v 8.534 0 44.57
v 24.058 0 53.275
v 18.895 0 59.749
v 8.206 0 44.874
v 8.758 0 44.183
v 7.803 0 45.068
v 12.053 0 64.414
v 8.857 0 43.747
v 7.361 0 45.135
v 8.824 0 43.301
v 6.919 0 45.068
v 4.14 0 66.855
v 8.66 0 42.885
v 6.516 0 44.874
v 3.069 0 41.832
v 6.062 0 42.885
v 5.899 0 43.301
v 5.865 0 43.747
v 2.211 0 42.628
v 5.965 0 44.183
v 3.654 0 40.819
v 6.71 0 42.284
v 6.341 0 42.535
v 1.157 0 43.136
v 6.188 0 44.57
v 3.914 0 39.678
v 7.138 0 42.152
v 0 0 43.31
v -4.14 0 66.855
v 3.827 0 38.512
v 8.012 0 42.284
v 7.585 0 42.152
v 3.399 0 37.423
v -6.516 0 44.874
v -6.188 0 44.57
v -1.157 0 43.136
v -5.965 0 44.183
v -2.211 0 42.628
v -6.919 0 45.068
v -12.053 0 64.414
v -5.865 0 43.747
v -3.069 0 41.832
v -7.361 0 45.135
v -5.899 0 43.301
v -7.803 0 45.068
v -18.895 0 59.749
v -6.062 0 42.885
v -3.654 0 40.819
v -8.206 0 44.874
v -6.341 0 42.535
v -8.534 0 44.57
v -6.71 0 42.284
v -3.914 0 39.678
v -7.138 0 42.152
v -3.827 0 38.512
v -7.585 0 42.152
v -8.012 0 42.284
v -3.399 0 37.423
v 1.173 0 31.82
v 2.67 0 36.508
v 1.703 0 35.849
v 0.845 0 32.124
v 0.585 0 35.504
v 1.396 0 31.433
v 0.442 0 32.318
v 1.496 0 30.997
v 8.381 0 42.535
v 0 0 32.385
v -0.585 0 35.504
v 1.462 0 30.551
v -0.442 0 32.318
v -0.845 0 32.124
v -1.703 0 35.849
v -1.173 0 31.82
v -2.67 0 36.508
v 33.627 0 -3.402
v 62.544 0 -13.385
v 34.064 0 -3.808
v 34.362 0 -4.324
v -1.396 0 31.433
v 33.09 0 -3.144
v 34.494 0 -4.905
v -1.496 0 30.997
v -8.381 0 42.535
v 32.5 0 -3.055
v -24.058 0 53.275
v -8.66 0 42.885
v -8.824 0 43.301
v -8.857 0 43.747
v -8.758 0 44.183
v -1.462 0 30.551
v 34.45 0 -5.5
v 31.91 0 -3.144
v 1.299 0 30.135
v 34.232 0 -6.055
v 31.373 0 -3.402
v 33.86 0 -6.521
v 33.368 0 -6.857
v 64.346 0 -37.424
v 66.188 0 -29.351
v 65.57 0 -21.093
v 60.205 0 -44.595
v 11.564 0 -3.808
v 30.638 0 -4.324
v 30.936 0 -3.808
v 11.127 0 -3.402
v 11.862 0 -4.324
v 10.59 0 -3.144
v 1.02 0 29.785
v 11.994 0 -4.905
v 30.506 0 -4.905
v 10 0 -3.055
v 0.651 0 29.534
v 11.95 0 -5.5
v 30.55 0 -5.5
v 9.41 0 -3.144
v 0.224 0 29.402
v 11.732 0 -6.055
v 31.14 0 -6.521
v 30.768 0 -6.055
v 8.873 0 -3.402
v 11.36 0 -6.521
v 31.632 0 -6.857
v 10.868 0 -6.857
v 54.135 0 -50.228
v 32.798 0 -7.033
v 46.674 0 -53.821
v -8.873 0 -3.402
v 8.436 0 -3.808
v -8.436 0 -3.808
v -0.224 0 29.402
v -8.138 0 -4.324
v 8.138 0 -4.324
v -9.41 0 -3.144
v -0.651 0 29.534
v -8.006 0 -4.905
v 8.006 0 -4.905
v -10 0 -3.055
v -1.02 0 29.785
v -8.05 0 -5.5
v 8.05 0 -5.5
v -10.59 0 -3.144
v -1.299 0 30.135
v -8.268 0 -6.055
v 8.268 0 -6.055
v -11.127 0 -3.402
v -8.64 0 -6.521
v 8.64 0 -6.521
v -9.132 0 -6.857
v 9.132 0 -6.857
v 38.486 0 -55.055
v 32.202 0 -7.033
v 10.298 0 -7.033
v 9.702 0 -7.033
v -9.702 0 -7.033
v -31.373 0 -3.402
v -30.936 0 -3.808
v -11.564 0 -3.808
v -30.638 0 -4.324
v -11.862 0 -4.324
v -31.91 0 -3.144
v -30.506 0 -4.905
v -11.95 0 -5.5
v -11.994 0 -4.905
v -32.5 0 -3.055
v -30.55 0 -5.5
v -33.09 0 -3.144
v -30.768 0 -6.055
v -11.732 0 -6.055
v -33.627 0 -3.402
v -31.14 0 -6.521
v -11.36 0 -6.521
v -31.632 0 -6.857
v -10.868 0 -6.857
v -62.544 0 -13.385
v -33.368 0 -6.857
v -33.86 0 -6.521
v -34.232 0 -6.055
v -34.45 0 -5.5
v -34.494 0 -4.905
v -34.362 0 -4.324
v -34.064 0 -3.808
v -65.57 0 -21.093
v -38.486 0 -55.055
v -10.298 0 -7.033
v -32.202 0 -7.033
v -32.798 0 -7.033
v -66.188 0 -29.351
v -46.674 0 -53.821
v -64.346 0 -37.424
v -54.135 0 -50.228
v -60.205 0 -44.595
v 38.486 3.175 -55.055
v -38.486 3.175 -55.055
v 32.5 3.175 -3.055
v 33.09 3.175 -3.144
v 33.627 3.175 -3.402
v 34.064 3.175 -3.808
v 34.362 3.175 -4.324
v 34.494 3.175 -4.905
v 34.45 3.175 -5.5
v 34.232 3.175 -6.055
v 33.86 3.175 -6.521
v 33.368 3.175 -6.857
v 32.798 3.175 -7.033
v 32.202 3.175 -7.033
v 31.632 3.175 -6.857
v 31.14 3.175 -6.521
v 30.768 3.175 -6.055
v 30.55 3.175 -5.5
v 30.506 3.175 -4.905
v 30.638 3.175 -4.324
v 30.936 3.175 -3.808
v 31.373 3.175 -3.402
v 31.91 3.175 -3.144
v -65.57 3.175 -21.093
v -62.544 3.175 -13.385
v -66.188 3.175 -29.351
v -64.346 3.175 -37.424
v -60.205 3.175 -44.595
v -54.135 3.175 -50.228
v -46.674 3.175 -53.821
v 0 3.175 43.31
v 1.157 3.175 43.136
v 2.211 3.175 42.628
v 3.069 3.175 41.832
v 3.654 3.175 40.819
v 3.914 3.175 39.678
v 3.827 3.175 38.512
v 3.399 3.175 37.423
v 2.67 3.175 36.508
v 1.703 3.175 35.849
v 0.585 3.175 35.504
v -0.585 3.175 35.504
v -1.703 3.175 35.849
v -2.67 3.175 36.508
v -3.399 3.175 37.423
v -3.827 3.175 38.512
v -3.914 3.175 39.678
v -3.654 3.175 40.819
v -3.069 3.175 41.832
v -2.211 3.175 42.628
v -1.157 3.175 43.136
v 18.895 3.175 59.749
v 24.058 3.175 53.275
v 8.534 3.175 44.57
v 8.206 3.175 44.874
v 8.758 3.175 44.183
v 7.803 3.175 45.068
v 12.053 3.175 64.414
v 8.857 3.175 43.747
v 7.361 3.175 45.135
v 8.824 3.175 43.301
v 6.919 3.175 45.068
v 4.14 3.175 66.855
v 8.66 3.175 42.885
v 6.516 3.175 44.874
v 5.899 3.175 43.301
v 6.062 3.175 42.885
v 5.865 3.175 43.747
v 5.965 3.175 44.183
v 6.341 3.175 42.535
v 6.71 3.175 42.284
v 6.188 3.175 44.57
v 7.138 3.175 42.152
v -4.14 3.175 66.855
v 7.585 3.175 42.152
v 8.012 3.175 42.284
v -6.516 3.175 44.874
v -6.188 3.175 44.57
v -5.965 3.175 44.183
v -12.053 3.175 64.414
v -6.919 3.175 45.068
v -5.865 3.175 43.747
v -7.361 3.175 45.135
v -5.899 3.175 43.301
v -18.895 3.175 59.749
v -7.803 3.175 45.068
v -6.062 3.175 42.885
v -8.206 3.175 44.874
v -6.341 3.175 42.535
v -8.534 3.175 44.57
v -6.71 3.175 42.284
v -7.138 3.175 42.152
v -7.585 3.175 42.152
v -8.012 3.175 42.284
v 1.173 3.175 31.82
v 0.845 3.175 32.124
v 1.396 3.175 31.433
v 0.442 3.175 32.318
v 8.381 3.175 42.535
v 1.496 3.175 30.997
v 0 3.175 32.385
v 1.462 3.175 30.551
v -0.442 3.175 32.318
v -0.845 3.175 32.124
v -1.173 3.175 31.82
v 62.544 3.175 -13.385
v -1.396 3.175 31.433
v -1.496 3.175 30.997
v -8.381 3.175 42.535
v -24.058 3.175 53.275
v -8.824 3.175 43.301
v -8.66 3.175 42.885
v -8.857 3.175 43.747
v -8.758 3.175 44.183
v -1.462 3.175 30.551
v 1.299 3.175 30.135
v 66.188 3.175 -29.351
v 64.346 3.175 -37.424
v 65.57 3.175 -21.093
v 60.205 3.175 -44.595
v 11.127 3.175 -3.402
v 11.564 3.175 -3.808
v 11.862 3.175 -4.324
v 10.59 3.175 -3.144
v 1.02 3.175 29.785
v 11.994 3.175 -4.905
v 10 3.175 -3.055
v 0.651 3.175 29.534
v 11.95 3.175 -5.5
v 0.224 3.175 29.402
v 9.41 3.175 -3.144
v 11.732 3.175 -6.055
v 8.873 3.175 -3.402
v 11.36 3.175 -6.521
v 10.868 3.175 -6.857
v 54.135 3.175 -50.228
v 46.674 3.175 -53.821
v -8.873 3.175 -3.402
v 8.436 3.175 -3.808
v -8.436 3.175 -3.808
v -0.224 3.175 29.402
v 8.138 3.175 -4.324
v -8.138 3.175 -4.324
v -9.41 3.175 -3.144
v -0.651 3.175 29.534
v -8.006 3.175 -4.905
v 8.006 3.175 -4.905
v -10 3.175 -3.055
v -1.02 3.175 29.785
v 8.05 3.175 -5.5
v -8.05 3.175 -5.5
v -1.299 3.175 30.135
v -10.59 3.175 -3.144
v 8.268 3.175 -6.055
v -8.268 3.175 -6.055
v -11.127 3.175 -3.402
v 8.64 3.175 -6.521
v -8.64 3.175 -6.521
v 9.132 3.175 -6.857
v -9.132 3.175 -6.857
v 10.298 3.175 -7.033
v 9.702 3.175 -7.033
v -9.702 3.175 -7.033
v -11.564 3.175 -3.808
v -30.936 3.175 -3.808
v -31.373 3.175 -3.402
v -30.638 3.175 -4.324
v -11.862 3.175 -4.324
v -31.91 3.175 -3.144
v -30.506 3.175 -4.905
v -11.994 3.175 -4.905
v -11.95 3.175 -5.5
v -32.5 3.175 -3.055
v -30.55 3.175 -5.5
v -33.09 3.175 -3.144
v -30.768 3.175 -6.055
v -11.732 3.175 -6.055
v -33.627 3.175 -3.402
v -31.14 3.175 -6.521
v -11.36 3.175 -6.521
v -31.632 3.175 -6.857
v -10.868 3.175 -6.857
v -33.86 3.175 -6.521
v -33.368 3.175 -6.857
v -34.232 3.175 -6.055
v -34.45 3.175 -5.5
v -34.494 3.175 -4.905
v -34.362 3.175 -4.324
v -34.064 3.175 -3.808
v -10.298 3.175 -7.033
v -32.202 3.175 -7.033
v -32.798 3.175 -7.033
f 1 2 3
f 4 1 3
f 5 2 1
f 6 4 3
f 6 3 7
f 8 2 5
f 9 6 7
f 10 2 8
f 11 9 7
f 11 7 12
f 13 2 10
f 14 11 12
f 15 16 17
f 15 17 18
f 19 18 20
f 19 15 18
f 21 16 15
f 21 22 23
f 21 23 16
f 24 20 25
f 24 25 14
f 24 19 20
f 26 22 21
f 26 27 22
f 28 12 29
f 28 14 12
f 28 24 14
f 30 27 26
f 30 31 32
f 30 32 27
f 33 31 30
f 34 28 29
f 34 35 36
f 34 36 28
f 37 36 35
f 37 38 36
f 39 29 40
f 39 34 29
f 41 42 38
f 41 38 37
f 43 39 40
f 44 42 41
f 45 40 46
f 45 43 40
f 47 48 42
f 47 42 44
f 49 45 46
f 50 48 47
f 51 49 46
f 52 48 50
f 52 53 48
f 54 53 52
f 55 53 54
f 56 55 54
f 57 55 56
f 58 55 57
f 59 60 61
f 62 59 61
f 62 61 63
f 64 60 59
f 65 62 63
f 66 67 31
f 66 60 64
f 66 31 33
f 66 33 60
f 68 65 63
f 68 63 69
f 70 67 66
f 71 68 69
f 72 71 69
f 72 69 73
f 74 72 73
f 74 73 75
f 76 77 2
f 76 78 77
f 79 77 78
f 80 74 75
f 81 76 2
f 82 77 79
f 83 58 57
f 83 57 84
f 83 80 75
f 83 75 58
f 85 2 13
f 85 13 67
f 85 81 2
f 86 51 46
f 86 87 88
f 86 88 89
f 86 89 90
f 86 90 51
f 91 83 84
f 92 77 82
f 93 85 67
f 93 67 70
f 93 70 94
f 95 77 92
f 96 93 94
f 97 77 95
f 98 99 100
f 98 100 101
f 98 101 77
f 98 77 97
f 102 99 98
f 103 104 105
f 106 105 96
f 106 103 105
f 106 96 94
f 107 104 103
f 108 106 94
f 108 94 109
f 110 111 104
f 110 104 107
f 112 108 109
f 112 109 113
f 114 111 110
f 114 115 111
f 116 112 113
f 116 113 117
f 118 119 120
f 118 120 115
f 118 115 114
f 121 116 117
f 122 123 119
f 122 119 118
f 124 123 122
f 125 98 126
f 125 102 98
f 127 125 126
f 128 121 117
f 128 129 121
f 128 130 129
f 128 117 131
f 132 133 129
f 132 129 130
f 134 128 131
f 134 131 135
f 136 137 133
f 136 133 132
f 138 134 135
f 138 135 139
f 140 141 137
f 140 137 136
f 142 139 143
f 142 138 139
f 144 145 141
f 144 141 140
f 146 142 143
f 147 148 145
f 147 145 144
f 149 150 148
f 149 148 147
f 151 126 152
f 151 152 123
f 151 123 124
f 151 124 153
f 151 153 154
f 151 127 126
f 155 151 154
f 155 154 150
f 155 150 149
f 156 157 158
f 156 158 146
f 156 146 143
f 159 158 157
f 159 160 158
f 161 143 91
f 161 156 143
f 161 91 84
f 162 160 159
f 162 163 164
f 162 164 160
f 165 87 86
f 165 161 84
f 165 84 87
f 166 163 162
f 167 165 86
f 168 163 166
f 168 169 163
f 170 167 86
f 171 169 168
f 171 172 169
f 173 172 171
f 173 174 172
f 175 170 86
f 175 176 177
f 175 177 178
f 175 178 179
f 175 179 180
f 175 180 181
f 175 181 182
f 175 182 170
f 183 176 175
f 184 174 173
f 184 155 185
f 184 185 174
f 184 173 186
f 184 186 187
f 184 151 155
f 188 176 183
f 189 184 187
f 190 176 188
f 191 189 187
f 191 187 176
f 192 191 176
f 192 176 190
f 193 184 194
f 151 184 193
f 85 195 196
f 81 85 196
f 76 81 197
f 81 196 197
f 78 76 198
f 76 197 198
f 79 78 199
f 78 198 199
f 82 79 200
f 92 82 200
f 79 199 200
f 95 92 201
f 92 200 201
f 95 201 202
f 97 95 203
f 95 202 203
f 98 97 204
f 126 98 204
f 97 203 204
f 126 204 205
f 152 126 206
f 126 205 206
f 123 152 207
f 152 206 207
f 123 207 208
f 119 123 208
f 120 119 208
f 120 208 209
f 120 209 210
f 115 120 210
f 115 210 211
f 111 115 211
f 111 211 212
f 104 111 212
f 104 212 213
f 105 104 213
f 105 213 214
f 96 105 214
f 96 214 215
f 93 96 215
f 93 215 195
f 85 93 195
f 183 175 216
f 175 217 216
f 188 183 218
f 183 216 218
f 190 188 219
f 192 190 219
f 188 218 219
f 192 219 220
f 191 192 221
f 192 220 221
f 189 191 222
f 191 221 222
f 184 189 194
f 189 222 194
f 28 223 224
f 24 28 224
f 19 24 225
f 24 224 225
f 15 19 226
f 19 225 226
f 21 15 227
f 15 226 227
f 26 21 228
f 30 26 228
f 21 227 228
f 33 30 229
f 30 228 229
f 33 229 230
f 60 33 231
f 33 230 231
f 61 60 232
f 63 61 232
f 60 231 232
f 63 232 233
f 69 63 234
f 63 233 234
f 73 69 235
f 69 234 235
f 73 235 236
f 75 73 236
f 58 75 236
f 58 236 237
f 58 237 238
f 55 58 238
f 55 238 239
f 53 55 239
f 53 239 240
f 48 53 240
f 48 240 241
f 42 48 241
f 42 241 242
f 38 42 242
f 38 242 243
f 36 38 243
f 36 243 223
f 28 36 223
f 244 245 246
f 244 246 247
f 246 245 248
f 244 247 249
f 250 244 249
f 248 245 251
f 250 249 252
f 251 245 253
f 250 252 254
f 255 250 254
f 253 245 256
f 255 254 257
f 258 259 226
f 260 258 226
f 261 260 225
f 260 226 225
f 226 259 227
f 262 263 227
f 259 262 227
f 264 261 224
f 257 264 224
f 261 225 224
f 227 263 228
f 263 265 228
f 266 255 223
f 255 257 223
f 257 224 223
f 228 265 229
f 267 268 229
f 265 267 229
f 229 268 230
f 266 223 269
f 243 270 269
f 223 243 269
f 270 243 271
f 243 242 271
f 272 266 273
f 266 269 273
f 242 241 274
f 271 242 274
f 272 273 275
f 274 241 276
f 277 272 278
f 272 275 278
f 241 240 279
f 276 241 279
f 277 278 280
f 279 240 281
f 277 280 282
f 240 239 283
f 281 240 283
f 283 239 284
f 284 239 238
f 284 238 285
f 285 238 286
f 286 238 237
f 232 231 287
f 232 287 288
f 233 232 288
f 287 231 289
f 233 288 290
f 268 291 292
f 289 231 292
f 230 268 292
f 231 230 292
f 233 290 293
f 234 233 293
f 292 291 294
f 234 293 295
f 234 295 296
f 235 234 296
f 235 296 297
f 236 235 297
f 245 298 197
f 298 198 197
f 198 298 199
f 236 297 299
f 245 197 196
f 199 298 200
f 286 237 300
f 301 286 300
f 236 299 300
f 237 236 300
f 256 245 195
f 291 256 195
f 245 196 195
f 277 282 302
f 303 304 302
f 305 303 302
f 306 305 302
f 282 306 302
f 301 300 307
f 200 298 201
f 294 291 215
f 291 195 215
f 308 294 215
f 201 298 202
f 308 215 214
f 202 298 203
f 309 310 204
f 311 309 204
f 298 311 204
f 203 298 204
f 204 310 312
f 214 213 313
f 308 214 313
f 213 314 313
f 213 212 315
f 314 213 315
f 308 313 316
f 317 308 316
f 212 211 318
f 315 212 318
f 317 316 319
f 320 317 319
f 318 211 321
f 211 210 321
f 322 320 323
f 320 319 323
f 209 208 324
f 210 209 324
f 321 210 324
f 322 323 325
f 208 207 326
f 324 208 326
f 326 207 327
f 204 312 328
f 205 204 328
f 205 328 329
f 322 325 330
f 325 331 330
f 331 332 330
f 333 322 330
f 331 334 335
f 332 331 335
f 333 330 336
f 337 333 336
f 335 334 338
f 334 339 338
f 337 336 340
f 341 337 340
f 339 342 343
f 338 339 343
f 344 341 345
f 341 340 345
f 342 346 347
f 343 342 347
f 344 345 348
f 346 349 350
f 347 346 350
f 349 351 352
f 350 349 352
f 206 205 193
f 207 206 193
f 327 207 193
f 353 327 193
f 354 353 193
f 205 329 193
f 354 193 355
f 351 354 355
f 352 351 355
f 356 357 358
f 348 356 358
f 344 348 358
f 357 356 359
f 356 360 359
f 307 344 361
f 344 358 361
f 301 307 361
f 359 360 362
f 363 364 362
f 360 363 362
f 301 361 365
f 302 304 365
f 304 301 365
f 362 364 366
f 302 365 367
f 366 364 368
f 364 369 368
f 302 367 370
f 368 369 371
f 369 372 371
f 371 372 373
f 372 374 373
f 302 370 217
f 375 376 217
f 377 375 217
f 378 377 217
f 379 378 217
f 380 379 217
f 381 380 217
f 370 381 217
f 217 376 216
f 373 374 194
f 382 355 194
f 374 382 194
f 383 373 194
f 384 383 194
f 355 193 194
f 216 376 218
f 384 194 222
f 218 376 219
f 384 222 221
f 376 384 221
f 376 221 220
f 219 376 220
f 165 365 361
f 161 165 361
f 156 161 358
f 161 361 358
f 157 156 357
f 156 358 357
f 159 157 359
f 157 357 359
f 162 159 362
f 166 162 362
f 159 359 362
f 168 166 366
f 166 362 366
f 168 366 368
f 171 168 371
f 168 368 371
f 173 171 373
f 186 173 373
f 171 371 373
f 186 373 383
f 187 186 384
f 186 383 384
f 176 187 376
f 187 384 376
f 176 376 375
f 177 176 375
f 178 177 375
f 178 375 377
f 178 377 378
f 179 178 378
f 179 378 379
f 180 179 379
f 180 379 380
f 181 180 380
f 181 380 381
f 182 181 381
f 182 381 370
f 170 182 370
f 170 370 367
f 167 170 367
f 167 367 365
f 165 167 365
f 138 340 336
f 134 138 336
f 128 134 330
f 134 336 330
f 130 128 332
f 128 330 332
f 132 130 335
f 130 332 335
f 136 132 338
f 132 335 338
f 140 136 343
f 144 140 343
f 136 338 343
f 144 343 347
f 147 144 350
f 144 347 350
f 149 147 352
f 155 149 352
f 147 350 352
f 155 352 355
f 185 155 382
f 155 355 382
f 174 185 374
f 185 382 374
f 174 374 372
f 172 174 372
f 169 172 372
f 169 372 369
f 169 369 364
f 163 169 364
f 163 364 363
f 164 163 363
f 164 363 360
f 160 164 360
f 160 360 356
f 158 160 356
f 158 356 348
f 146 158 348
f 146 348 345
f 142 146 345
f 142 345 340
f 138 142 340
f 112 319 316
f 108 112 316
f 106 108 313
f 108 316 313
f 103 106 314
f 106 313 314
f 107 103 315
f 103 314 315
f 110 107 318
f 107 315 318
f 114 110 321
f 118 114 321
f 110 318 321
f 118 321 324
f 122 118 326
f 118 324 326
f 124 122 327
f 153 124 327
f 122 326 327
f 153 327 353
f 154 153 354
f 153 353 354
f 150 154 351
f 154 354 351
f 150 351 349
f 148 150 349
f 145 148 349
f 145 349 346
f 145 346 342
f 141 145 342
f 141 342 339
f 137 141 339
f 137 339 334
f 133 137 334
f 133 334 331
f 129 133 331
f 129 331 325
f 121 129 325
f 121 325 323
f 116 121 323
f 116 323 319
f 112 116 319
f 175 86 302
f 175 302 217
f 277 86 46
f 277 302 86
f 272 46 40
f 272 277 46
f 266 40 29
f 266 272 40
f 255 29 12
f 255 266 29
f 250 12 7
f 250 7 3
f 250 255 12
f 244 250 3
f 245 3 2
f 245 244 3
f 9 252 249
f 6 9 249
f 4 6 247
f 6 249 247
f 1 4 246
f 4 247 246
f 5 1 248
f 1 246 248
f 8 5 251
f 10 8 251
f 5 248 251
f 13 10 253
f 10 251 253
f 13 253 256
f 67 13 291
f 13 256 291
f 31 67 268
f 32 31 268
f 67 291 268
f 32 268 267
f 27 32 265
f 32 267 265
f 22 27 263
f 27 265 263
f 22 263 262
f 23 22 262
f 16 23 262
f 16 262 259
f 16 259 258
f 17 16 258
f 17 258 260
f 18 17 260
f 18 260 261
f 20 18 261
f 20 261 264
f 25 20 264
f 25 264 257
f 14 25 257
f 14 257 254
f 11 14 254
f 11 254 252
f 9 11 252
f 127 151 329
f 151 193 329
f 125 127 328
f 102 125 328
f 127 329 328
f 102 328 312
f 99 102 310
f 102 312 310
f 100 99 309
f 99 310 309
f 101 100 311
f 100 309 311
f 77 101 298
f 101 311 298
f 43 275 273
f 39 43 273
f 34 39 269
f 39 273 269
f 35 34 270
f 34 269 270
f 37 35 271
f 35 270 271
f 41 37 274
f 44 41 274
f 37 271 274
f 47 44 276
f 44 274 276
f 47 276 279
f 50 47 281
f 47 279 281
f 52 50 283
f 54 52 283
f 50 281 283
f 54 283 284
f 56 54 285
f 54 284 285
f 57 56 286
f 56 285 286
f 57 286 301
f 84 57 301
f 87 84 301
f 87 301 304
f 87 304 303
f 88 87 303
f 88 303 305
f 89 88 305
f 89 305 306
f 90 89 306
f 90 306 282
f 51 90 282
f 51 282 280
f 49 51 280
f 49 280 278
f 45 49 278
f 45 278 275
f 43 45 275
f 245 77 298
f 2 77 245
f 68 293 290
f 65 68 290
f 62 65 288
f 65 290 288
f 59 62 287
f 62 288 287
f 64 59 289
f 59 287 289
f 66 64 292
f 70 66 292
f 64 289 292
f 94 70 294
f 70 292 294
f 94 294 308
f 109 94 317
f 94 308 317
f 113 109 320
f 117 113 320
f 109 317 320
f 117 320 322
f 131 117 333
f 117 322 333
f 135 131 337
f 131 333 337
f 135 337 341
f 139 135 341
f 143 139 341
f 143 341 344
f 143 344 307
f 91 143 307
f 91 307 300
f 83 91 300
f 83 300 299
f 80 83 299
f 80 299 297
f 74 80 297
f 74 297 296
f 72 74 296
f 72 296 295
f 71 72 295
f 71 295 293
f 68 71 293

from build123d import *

# Parameters (mm, degrees)
BOSS_EXTRUDE1_DEPTH = 3.175
FILLET1_R           = 27.78
SKETCH5_R           = 2
CUT_EXTRUDE2_DEPTH  = 95.405671522
SKETCH7_R           = 1.5
SKETCH7_R_2         = 3.925
CUT_EXTRUDE3_DEPTH  = 10


with BuildPart() as part:
    # Sketch1 → Boss-Extrude1 (new body)
    with BuildSketch(Plane(origin=(0, 0, 0), x_dir=(1, 0, 0), z_dir=(0, 1, 0))):
        Polygon((0, -94.945058207), (-86.602540378, 55.054941793), (86.602540378, 55.054941793), align=None)
    extrude(amount=BOSS_EXTRUDE1_DEPTH)

    # Fillet1
    fillet1_edges = [part.edges().sort_by_distance(p)[0] for p in [
        (0, 1.5875, 94.945058207),
        (-86.602540378, 1.5875, -55.054941793),
        (86.602540378, 1.5875, -55.054941793),
    ]]
    fillet(fillet1_edges, radius=FILLET1_R)

    # Sketch5 → Cut-Extrude2 (cut, through all)
    with BuildSketch(Plane(origin=(0, 3.175, 0), x_dir=(1, 0, 0), z_dir=(0, 1, 0))):
        with Locations(Location((32.5, 5.054941793, 0), (0, 0, 270))):
            Circle(SKETCH5_R)
        with Locations(Location((-32.5, 5.054941793, 0), (0, 0, 270))):
            Circle(SKETCH5_R)
        with Locations(Location((-10, 5.054941793, 0), (0, 0, 270))):
            Circle(SKETCH5_R)
        with Locations(Location((10, 5.054941793, 0), (0, 0, 270))):
            Circle(SKETCH5_R)
    extrude(amount=-CUT_EXTRUDE2_DEPTH, mode=Mode.SUBTRACT)

    # Sketch7 → Cut-Extrude3 (cut)
    with BuildSketch(Plane(origin=(0, 3.175, 0), x_dir=(1, 0, 0), z_dir=(0, 1, 0))):
        with Locations(Location((0, -30.885058207, 0), (0, 0, 270))):
            Circle(SKETCH7_R)
        with Locations(Location((-7.361215932, -43.635058207, 0), (0, 0, 270))):
            Circle(SKETCH7_R)
        with Locations(Location((0, -39.385058207, 0), (0, 0, 270))):
            Circle(SKETCH7_R_2)
        with Locations(Location((7.361215932, -43.635058207, 0), (0, 0, 270))):
            Circle(SKETCH7_R)
    extrude(amount=-CUT_EXTRUDE3_DEPTH, mode=Mode.SUBTRACT)


solid = part.part
